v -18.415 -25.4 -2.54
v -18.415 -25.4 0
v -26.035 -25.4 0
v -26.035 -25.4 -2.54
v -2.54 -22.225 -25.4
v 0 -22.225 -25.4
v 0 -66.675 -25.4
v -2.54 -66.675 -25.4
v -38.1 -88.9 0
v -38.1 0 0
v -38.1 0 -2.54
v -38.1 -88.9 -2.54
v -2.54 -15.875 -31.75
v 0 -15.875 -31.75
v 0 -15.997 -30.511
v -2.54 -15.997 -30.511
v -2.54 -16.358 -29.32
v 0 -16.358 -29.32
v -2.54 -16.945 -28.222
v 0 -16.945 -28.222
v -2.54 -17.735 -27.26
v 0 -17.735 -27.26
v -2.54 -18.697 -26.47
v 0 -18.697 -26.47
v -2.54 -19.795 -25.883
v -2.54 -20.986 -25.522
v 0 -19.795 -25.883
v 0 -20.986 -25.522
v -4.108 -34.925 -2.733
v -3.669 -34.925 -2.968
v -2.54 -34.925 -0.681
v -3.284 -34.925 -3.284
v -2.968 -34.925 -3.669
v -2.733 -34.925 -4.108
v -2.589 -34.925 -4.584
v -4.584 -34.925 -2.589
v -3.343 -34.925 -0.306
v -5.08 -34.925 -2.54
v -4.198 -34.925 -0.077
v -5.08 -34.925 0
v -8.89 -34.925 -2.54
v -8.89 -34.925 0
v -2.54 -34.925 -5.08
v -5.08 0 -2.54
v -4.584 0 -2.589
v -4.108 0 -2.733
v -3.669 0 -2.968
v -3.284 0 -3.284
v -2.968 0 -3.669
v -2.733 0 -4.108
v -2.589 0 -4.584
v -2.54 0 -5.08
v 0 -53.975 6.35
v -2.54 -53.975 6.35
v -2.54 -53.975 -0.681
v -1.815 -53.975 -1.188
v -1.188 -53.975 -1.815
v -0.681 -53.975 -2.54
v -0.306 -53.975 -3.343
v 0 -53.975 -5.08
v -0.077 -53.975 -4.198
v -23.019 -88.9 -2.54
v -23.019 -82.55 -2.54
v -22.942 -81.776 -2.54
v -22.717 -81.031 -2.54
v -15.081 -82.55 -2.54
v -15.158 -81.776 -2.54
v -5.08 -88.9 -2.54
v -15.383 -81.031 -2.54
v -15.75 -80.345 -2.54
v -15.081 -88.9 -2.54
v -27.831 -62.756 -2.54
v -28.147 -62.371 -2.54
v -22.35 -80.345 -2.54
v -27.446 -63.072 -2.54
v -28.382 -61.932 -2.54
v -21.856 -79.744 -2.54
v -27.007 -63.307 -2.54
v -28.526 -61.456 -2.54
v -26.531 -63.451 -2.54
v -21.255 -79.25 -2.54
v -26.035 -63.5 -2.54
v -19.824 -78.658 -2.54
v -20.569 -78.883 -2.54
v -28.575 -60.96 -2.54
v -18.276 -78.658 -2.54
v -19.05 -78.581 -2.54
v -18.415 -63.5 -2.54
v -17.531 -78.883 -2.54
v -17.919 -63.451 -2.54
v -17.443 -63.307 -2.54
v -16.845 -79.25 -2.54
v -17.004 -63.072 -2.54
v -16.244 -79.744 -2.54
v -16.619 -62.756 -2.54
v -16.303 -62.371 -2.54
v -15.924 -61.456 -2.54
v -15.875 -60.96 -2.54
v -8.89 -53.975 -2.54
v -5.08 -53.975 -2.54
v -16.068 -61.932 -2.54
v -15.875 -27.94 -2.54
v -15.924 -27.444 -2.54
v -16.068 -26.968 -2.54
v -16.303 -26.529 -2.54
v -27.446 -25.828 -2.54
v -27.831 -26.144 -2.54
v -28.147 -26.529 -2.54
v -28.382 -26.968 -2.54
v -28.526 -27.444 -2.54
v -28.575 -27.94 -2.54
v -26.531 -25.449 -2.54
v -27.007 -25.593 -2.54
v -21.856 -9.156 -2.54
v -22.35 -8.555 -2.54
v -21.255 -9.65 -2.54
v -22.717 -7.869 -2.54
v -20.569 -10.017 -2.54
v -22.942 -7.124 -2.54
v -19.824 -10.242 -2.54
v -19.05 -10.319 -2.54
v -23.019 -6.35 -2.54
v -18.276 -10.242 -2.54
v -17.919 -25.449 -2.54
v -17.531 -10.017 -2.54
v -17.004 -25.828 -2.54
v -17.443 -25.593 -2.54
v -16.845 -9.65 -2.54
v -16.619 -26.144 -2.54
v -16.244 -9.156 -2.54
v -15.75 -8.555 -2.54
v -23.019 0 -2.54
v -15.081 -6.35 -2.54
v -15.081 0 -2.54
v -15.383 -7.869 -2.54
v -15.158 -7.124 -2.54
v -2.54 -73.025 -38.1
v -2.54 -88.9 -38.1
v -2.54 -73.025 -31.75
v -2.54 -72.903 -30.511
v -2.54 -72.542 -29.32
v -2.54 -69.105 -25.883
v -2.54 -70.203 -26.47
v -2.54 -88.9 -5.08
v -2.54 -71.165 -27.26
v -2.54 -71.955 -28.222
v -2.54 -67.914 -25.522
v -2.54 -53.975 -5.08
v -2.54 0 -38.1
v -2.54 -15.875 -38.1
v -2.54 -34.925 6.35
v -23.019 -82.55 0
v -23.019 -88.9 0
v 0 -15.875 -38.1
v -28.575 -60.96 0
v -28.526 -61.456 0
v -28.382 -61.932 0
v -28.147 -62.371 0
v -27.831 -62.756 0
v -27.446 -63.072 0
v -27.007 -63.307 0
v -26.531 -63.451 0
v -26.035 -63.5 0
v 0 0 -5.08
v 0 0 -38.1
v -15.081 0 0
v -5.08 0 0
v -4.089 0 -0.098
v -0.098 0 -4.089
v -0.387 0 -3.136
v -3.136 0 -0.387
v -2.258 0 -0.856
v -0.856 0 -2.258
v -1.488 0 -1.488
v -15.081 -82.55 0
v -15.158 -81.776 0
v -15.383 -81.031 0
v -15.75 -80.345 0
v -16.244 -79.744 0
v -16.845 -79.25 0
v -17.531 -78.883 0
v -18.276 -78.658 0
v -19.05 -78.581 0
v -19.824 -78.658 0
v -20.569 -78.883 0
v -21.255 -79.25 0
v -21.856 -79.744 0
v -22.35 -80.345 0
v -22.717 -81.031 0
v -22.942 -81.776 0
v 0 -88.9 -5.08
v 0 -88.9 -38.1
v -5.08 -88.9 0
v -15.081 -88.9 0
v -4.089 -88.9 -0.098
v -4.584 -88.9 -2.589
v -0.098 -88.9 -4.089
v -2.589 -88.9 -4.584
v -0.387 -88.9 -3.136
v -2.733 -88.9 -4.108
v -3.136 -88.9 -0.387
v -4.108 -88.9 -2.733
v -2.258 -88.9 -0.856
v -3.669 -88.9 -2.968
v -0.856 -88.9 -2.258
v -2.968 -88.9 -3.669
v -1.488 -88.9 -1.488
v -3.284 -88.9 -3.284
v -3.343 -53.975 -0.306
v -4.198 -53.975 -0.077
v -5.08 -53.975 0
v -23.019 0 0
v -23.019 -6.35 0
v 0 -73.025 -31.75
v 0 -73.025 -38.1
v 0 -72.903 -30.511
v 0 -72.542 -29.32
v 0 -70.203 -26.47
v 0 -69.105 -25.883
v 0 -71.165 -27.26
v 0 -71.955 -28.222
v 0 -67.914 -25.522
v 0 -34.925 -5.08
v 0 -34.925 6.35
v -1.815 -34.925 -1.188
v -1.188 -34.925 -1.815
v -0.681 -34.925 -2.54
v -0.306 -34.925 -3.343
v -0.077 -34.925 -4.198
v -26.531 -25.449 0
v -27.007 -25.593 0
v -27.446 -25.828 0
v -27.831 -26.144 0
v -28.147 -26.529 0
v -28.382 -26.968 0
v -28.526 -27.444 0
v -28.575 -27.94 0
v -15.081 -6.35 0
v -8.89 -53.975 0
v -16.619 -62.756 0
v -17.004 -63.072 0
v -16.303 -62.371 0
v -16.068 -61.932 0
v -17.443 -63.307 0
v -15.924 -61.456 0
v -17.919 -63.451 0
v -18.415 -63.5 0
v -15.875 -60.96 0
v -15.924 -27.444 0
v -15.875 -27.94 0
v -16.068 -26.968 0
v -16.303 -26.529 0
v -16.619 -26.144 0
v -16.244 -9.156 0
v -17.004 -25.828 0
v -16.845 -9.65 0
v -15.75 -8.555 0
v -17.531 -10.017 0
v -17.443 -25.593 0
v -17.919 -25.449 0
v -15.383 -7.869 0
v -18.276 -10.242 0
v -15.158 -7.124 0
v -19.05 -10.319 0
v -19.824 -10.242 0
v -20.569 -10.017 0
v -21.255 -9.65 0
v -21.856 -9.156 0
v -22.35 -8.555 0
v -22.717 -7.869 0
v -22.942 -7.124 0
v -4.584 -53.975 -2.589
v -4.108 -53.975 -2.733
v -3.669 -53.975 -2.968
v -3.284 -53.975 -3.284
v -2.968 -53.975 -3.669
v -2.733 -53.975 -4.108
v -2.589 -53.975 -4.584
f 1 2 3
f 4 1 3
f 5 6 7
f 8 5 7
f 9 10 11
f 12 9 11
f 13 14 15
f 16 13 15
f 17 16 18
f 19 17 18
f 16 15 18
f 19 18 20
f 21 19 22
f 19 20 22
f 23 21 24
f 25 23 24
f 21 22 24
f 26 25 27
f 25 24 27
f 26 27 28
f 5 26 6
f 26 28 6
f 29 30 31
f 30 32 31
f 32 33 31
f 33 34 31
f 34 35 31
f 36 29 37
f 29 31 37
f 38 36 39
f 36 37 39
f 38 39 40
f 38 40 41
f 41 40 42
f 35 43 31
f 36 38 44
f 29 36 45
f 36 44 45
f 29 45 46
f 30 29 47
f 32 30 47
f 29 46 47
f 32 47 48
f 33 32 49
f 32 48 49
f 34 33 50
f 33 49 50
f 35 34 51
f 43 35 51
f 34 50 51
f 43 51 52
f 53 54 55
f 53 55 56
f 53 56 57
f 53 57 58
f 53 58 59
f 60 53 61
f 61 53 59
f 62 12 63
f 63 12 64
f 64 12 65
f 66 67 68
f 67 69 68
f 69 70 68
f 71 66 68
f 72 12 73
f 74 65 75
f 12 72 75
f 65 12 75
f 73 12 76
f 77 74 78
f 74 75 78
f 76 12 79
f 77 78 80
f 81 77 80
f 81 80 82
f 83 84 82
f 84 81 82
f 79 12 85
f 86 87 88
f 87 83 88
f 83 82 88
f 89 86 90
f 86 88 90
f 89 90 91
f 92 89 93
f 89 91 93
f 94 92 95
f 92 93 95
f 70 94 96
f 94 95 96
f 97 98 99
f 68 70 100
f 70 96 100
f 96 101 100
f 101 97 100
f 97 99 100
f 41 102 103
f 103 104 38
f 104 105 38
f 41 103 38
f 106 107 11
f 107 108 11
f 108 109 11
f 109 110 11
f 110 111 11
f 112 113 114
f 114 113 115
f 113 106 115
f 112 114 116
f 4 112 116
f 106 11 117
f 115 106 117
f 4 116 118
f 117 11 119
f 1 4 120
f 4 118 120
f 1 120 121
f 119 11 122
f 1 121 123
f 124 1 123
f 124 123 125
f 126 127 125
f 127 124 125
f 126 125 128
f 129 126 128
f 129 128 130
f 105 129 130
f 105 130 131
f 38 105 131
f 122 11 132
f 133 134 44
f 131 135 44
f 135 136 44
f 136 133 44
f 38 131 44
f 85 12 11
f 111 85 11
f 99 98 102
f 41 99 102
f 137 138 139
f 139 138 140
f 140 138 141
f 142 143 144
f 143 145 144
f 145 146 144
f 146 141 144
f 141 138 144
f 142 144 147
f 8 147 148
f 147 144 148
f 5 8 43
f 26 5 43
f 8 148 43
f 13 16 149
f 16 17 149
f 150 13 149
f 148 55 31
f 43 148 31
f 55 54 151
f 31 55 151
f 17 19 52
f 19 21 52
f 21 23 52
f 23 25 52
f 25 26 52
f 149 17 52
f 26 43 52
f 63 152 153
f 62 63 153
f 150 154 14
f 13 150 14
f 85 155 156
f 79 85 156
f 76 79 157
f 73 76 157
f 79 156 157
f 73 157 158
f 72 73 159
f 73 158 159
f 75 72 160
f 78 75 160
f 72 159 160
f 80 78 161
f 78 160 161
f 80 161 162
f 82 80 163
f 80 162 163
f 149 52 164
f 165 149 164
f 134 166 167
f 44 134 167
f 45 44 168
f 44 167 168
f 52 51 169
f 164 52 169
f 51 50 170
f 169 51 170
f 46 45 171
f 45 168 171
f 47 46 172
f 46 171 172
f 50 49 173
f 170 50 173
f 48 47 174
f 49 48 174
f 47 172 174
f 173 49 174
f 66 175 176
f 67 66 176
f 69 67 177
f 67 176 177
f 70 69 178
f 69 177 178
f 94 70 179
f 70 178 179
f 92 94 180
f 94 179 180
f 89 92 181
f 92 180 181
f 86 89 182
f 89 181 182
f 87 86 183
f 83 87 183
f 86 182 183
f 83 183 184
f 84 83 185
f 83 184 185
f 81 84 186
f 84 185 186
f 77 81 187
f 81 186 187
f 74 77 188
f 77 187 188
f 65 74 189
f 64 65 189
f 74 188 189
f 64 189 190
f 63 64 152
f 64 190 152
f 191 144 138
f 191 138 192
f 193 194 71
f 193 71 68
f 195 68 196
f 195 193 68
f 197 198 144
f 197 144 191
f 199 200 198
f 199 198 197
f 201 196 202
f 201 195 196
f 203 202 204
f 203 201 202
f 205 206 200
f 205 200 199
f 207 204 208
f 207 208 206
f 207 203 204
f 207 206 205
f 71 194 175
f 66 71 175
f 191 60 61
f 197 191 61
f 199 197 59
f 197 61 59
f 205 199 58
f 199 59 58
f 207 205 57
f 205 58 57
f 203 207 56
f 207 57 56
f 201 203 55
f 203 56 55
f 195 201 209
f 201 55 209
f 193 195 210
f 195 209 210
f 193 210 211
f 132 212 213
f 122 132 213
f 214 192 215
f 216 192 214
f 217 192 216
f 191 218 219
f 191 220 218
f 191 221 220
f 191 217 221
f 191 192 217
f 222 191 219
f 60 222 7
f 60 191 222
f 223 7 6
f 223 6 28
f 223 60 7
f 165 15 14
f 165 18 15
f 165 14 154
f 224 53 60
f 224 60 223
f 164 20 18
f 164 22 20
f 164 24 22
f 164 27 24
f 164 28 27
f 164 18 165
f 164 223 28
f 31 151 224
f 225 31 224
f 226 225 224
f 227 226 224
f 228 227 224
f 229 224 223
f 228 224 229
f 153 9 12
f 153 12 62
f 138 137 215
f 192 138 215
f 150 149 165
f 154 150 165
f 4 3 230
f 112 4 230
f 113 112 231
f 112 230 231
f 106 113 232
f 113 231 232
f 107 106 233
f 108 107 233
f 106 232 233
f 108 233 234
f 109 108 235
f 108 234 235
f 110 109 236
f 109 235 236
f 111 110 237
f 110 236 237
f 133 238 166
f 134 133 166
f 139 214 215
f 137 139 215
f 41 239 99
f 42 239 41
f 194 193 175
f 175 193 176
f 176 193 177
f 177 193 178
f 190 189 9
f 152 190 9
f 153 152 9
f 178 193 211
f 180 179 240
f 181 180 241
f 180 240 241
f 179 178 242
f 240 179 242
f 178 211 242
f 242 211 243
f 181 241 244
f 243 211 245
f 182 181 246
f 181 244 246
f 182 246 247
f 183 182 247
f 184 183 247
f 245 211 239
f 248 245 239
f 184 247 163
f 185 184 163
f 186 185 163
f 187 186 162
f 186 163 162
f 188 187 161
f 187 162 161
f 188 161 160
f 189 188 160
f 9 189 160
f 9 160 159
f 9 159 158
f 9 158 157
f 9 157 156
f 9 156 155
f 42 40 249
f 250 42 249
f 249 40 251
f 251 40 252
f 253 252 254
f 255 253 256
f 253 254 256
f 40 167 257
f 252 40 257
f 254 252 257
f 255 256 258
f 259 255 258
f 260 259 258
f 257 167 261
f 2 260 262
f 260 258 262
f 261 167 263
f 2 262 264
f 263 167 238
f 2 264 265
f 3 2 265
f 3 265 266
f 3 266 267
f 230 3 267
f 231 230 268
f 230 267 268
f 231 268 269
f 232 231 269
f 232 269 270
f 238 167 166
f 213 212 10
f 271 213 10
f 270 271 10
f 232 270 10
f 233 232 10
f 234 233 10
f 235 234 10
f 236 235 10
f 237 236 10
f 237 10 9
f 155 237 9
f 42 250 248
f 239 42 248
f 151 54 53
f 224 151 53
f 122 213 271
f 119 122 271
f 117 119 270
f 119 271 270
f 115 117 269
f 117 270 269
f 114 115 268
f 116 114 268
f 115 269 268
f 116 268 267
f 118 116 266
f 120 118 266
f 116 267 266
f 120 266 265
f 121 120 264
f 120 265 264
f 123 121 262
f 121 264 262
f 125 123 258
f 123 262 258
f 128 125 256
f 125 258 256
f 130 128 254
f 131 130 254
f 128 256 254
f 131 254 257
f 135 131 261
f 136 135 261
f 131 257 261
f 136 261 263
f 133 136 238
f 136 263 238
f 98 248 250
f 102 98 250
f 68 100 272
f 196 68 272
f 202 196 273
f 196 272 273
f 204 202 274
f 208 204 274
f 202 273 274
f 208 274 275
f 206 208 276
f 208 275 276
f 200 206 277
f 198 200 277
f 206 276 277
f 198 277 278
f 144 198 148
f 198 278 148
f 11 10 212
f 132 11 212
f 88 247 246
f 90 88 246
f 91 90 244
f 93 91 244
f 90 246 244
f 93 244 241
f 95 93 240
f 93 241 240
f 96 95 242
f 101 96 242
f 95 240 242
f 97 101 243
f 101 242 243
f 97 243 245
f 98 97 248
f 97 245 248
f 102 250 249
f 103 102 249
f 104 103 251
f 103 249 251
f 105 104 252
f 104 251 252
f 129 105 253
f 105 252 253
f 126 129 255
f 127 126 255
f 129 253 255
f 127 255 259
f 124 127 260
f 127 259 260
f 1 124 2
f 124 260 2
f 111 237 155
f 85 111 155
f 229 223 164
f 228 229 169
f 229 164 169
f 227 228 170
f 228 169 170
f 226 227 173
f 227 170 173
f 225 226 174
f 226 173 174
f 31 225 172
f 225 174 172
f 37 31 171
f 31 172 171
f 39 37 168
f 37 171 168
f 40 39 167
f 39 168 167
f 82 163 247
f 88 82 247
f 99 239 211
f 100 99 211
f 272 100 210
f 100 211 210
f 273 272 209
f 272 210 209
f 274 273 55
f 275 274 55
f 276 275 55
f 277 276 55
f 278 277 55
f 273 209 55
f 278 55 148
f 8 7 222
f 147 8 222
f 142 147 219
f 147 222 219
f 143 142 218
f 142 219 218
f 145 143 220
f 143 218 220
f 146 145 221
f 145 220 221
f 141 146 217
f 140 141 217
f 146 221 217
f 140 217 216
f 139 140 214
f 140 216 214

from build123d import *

# Parameters (mm, degrees)
F1_DEPTH      = 88.9
F2_W          = 2.54
F2_H          = 19.05
F2_W_2        = 3.81
F3_DEPTH      = 25.4
F4_W          = 2.54
F4_H          = 19.05
F5_DEPTH      = 6.35
F5_DEPTH_BACK = 6.35
F7_DEPTH      = 25.4
F9_DEPTH      = 25.4
F11_DEPTH     = 25.4


with BuildPart() as f1:
    # F0 (on Front) → F1 (new body)
    with BuildSketch(Plane.XZ):
        with BuildLine():
            ThreePointArc((0, -5.08), (-1.4878975516, -1.4878975516), (-5.08, 0))
            Line((-5.08, 0), (-38.1, 0))
            Line((-38.1, 0), (-38.1, -2.54))
            Line((-38.1, -2.54), (-5.08, -2.54))
            ThreePointArc((-5.08, -2.54), (-3.2839487758, -3.2839487758), (-2.54, -5.08))
            Line((-2.54, -5.08), (-2.54, -38.1))
            Line((-2.54, -38.1), (0, -38.1))
            Line((0, -38.1), (0, -5.08))
        make_face()
    extrude(amount=F1_DEPTH)

    # F2 (on face) → F3 (cut)
    with BuildSketch(Plane.XY):
        with Locations((-3.81, -44.45)):
            Rectangle(F2_W, F2_H)
        with Locations((-6.985, -44.45)):
            Rectangle(F2_W_2, F2_H)
    extrude(amount=-F3_DEPTH, mode=Mode.SUBTRACT)

    # F4 (on face) → F5 (join, two sides)
    with BuildSketch(Plane.XY) as f5_sk:
        with Locations((-1.27, -44.45)):
            Rectangle(F4_W, F4_H)
    extrude(amount=F5_DEPTH)
    extrude(f5_sk.sketch, amount=-F5_DEPTH_BACK)

    # F6 (on face) → F7 (cut)
    with BuildSketch(Plane.XY):
        with BuildLine():
            Line((-23.01875, 0), (-23.01875, -6.35))
            ThreePointArc((-23.01875, -6.35), (-19.05, -10.31875), (-15.08125, -6.35))
            Line((-15.08125, -6.35), (-15.08125, 0))
            Line((-15.08125, 0), (-23.01875, 0))
        make_face()
        with BuildLine():
            Line((-15.08125, -88.9956355095), (-15.08125, -82.55))
            ThreePointArc((-15.08125, -82.55), (-19.05, -78.58125), (-23.01875, -82.55))
            Line((-23.01875, -82.55), (-23.01875, -88.9956355095))
            Line((-23.01875, -88.9956355095), (-15.08125, -88.9956355095))
        make_face()
    extrude(amount=-F7_DEPTH, mode=Mode.SUBTRACT)

    # F8 (on face) → F9 (cut)
    with BuildSketch(Plane.XY):
        with BuildLine():
            Line((-18.415, -25.4), (-26.035, -25.4))
            ThreePointArc((-26.035, -25.4), (-27.8310512242, -26.1439487758), (-28.575, -27.94))
            Line((-28.575, -27.94), (-28.575, -60.96))
            ThreePointArc((-28.575, -60.96), (-27.8310512242, -62.7560512242), (-26.035, -63.5))
            Line((-26.035, -63.5), (-18.415, -63.5))
            ThreePointArc((-18.415, -63.5), (-16.6189487758, -62.7560512242), (-15.875, -60.96))
            Line((-15.875, -60.96), (-15.875, -27.94))
            ThreePointArc((-15.875, -27.94), (-16.6189487758, -26.1439487758), (-18.415, -25.4))
        make_face()
    extrude(amount=-F9_DEPTH, mode=Mode.SUBTRACT)

    # F10 (on face) → F11 (cut)
    with BuildSketch(Plane.YZ):
        with BuildLine():
            Line((-73.025, -31.75), (-73.025, -38.1))
            Line((-73.025, -38.1), (-15.875, -38.1))
            Line((-15.875, -38.1), (-15.875, -31.75))
            ThreePointArc((-15.875, -31.75), (-17.7348719395, -27.2598719395), (-22.225, -25.4))
            Line((-22.225, -25.4), (-66.675, -25.4))
            ThreePointArc((-66.675, -25.4), (-71.1651280605, -27.2598719395), (-73.025, -31.75))
        make_face()
    extrude(amount=-F11_DEPTH, mode=Mode.SUBTRACT)


solid = f1.part
